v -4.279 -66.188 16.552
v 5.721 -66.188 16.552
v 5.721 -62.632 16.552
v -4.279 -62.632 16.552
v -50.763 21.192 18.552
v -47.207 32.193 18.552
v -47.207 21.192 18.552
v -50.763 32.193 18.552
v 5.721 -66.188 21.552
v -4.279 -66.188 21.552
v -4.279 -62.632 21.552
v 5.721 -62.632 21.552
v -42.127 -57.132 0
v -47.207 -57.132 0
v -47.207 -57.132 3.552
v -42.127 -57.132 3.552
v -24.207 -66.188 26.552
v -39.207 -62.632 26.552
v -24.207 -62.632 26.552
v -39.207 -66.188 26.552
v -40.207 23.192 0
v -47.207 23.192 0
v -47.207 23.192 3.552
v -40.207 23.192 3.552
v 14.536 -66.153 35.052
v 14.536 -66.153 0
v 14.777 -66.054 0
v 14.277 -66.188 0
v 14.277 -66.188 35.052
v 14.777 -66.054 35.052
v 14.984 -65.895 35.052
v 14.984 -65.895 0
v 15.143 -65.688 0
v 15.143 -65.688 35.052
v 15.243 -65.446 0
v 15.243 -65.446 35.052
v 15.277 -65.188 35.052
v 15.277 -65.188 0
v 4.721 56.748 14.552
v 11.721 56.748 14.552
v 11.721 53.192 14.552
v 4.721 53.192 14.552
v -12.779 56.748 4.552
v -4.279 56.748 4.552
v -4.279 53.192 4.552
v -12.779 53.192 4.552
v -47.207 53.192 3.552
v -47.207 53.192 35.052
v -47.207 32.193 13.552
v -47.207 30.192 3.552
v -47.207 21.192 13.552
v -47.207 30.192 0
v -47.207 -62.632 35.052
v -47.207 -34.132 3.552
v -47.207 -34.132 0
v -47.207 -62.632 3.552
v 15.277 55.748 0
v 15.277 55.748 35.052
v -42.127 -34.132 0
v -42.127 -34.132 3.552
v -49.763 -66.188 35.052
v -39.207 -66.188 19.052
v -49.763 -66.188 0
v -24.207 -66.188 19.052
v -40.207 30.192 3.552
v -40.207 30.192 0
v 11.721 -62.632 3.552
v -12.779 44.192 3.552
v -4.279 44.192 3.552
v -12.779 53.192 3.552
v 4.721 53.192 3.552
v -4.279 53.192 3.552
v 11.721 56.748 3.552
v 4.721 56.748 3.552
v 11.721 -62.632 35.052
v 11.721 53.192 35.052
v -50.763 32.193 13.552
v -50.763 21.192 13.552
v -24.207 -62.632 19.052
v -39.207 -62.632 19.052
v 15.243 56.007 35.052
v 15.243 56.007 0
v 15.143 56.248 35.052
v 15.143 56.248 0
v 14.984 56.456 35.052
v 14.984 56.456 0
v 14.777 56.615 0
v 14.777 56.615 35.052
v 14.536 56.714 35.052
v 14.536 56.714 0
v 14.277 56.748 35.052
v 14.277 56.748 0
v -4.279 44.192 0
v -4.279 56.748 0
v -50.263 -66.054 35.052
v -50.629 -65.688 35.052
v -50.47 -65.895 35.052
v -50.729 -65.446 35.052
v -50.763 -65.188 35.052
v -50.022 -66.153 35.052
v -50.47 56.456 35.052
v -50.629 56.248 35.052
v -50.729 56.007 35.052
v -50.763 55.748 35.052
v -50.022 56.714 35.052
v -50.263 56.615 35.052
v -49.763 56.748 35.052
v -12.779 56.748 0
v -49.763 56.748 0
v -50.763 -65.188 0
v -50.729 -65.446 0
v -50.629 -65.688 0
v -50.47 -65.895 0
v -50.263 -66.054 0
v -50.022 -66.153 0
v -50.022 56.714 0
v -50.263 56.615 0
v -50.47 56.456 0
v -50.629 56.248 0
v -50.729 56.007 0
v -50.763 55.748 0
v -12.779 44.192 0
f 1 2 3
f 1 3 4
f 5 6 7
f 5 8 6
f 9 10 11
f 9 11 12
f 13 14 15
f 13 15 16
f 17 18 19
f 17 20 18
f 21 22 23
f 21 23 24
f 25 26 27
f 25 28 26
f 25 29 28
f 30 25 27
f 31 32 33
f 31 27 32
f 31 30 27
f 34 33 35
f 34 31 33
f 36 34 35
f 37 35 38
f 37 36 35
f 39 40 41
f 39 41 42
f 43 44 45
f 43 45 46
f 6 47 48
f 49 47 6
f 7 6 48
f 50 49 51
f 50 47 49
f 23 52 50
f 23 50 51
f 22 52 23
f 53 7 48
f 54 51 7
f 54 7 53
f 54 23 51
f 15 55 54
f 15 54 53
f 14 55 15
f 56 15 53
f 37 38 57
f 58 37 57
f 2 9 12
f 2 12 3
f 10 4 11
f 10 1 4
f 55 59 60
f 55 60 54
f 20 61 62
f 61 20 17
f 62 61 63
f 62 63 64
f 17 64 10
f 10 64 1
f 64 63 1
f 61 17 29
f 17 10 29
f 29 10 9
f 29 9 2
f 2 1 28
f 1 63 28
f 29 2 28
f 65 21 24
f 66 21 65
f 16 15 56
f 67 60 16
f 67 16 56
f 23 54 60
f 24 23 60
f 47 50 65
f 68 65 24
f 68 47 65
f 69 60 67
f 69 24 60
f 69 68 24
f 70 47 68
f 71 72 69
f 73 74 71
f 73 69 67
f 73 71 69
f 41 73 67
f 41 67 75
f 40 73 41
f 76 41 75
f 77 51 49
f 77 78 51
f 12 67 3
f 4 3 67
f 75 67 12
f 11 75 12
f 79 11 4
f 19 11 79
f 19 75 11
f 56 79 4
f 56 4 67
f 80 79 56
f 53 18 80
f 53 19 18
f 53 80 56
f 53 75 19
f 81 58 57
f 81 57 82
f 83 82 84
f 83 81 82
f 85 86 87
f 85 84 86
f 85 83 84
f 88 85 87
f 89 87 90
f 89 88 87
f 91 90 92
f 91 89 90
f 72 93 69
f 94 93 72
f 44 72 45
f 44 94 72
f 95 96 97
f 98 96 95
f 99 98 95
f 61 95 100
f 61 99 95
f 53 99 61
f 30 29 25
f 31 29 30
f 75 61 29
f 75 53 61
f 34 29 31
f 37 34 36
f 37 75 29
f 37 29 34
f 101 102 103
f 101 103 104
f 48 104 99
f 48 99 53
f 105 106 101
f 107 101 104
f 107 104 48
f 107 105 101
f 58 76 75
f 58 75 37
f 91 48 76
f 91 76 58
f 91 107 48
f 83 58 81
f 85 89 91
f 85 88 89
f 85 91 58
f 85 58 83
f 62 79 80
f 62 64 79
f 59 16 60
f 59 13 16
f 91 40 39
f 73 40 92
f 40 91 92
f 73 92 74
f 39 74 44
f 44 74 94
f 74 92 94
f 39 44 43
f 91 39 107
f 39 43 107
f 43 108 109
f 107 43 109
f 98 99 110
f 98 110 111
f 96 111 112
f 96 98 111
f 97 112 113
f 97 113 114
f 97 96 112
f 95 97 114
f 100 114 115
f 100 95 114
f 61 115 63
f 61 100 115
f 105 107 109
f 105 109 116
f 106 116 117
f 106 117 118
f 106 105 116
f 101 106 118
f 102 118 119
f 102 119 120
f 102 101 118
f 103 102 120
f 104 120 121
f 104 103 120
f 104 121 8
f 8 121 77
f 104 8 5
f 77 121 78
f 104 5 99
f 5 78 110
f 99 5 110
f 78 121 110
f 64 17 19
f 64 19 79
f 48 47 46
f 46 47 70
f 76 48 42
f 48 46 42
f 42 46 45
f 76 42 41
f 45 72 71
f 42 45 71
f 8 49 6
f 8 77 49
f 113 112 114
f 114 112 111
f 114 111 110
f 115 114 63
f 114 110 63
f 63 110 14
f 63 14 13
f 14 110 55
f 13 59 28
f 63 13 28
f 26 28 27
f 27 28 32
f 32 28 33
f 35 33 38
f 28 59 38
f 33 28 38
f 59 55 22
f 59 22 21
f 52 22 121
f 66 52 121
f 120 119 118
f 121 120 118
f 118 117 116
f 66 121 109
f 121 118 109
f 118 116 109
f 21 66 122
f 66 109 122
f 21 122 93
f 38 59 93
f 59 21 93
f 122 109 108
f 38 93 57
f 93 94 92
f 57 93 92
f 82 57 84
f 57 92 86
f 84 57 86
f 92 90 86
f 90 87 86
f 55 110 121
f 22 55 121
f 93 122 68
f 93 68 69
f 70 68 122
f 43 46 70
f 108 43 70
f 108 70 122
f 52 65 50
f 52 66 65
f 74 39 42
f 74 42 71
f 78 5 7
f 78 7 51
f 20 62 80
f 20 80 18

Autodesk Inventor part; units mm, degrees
ref_plane "YZ Plane" through (0, 0, 0) normal (1, 0, 0) x (0, 1, 0)
ref_plane "XZ Plane" through (0, 0, 0) normal (0, 1, 0) x (-1, 0, 0)
ref_plane "XY Plane" through (0, 0, 0) normal (0, 0, 1) x (1, 0, 0)
sketch "Sketch1" plane through (0, 0, 0) normal (0, 0, 1) x (1, 0, 0)
  line L0 (-50.7629, 56.7485) -> (-50.7629, -66.1875)
  line L1 (-50.7629, -66.1875) -> (15.2771, -66.1875)
  line L2 (15.2771, -66.1875) -> (15.2771, 56.7485)
  line L3 (15.2771, 56.7485) -> (-50.7629, 56.7485)
  point P0 (0, 0)
  dimension "d0" = 122.936
  dimension "d1" = 66.04
extrude "Extrusion1" add sketch "Sketch1" along normal blind 35.052
sketch "Sketch2" plane through (0, 0, 35.052) normal (0, 0, 1) x (1, 0, 0)
  line L0 (-47.2069, 53.1925) -> (11.7211, 53.1925)
  line L1 (11.7211, 53.1925) -> (11.7211, -62.6315)
  line L2 (11.7211, -62.6315) -> (-47.2069, -62.6315)
  line L3 (-47.2069, -62.6315) -> (-47.2069, 53.1925)
  line L4 (15.2771, 56.7485) -> (-50.7629, 56.7485) projected
  line L5 (15.2771, -66.1875) -> (15.2771, 56.7485) projected
  line L6 (-50.7629, -66.1875) -> (15.2771, -66.1875) projected
  line L7 (-50.7629, 56.7485) -> (-50.7629, -66.1875) projected
  point P0 (0, 0)
  dimension "d4" = 3.556
  dimension "d5" = 3.556
  dimension "d6" = 3.556
  dimension "d7" = 3.556
extrude "Extrusion2" cut sketch "Sketch2" against normal blind 31.5 contours L0 L1 L2 L3
sketch "Sketch3" plane through (-50.7629, -66.1875, 0) normal (0, -1, 0) x (1, 0, 0)
  line L0 (11.556, 26.552) -> (26.556, 26.552)
  line L1 (26.556, 26.552) -> (26.556, 19.052)
  line L2 (26.556, 19.052) -> (11.556, 19.052)
  line L3 (11.556, 19.052) -> (11.556, 26.552)
  line L4 (62.484, 3.552) -> (3.556, 3.552) projected
  line L5 (3.556, 35.052) -> (3.556, 3.552) projected
  line L6 (46.484, 21.552) -> (56.484, 21.552)
  line L7 (56.484, 21.552) -> (56.484, 16.552)
  line L8 (56.484, 16.552) -> (46.484, 16.552)
  line L9 (46.484, 16.552) -> (46.484, 21.552)
  line L10 (62.484, 35.052) -> (62.484, 3.552) projected
  point P0 (50.7629, 0)
  dimension "d10" = 23
  dimension "d11" = 8
  dimension "d12" = 7.5
  dimension "d13" = 15
  dimension "d14" = 18
  dimension "d15" = 5
  dimension "d16" = 10
  dimension "d17" = 16
extrude "Extrusion3" cut sketch "Sketch3" against normal blind 3.56
sketch "Sketch4" plane through (0, 0, 0) normal (0, 0, -1) x (-1, 0, 0)
  line L0 (42.1269, -34.1315) -> (47.2069, -34.1315)
  line L1 (47.2069, -34.1315) -> (47.2069, -57.1315)
  line L2 (47.2069, -57.1315) -> (42.1269, -57.1315)
  line L3 (42.1269, -57.1315) -> (42.1269, -34.1315)
  line L4 (47.2069, -62.6315) -> (47.2069, 53.1925) projected
  line L5 (-11.7211, -62.6315) -> (47.2069, -62.6315) projected
  line L6 (40.2069, 30.1925) -> (47.2069, 30.1925)
  line L7 (47.2069, 30.1925) -> (47.2069, 23.1925)
  line L8 (47.2069, 23.1925) -> (40.2069, 23.1925)
  line L9 (40.2069, 23.1925) -> (40.2069, 30.1925)
  line L10 (47.2069, 53.1925) -> (-11.7211, 53.1925) projected
  line L11 (4.2789, 53.1925) -> (12.7789, 53.1925)
  line L12 (12.7789, 53.1925) -> (12.7789, 44.1925)
  line L13 (12.7789, 44.1925) -> (4.2789, 44.1925)
  line L14 (4.2789, 44.1925) -> (4.2789, 53.1925)
  line L15 (-11.7211, 53.1925) -> (-11.7211, -62.6315) projected
  point P0 (0, 0)
  dimension "d20" = 0
  dimension "d21" = 5.5
  dimension "d22" = 23
  dimension "d23" = 5.08
  dimension "d24" = 30
  dimension "d25" = 7
  dimension "d26" = 7
  dimension "d27" = 0
  dimension "d28" = 9
  dimension "d29" = 8.5
  dimension "d30" = 0
  dimension "d31" = 16
extrude "Extrusion4" cut sketch "Sketch4" against normal blind 3.56 contours L0 L1 L2 L3 | L8 L9 L6 L4 | L12 L13 L14 L10
sketch "Sketch5" plane through (-50.7629, 56.7485, 0) normal (0, 1, 0) x (1, 0, 0)
  line L0 (62.484, -14.552) -> (55.484, -14.552)
  line L1 (55.484, -14.552) -> (55.484, -3.552)
  line L2 (55.484, -3.552) -> (62.484, -3.552)
  line L3 (62.484, -3.552) -> (62.484, -14.552)
  line L4 (62.484, -35.052) -> (62.484, -3.552) projected
  line L5 (46.484, -3.552) -> (62.484, -3.552) projected
  line L6 (46.484, -4.552) -> (37.984, -4.552)
  line L7 (37.984, -4.552) -> (37.984, 2.448)
  line L8 (37.984, 2.448) -> (46.484, 2.448)
  line L9 (46.484, 2.448) -> (46.484, -4.552)
  line L10 (46.484, -3.552) -> (37.984, -3.552) projected
  point P0 (50.7629, 0)
  dimension "d34" = 11
  dimension "d35" = 0
  dimension "d37" = 7
  dimension "d39" = 16
  dimension "d40" = 7
  dimension "d41" = 8.5
  dimension "d50" = 1
extrude "Extrusion5" cut sketch "Sketch5" against normal blind 3.56
sketch "Sketch6" plane through (-50.7629, -66.1875, 0) normal (-1, 0, 0) x (0, 0, 1)
  line L0 (13.552, 98.38) -> (18.552, 98.38)
  line L1 (18.552, 98.38) -> (18.552, 87.38)
  line L2 (18.552, 87.38) -> (13.552, 87.38)
  line L3 (13.552, 87.38) -> (13.552, 98.38)
  line L4 (3.552, 122.936) -> (3.552, 3.556) projected
  line L5 (35.052, 119.38) -> (3.552, 119.38) projected
  point P0 (0, 66.1875)
  dimension "d44" = 15
  dimension "d45" = 5
  dimension "d46" = 11
  dimension "d47" = 32
extrude "Extrusion6" cut sketch "Sketch6" against normal blind 3.56
fillet "Fillet1" radius 1 4 edges at (15.2771, 56.7485, 17.526) (-50.7629, 56.7485, 17.526) (-50.7629, -66.1875, 17.526) (15.2771, -66.1875, 17.526)
properties part number "Smart Lock Box Bottom Correct"
